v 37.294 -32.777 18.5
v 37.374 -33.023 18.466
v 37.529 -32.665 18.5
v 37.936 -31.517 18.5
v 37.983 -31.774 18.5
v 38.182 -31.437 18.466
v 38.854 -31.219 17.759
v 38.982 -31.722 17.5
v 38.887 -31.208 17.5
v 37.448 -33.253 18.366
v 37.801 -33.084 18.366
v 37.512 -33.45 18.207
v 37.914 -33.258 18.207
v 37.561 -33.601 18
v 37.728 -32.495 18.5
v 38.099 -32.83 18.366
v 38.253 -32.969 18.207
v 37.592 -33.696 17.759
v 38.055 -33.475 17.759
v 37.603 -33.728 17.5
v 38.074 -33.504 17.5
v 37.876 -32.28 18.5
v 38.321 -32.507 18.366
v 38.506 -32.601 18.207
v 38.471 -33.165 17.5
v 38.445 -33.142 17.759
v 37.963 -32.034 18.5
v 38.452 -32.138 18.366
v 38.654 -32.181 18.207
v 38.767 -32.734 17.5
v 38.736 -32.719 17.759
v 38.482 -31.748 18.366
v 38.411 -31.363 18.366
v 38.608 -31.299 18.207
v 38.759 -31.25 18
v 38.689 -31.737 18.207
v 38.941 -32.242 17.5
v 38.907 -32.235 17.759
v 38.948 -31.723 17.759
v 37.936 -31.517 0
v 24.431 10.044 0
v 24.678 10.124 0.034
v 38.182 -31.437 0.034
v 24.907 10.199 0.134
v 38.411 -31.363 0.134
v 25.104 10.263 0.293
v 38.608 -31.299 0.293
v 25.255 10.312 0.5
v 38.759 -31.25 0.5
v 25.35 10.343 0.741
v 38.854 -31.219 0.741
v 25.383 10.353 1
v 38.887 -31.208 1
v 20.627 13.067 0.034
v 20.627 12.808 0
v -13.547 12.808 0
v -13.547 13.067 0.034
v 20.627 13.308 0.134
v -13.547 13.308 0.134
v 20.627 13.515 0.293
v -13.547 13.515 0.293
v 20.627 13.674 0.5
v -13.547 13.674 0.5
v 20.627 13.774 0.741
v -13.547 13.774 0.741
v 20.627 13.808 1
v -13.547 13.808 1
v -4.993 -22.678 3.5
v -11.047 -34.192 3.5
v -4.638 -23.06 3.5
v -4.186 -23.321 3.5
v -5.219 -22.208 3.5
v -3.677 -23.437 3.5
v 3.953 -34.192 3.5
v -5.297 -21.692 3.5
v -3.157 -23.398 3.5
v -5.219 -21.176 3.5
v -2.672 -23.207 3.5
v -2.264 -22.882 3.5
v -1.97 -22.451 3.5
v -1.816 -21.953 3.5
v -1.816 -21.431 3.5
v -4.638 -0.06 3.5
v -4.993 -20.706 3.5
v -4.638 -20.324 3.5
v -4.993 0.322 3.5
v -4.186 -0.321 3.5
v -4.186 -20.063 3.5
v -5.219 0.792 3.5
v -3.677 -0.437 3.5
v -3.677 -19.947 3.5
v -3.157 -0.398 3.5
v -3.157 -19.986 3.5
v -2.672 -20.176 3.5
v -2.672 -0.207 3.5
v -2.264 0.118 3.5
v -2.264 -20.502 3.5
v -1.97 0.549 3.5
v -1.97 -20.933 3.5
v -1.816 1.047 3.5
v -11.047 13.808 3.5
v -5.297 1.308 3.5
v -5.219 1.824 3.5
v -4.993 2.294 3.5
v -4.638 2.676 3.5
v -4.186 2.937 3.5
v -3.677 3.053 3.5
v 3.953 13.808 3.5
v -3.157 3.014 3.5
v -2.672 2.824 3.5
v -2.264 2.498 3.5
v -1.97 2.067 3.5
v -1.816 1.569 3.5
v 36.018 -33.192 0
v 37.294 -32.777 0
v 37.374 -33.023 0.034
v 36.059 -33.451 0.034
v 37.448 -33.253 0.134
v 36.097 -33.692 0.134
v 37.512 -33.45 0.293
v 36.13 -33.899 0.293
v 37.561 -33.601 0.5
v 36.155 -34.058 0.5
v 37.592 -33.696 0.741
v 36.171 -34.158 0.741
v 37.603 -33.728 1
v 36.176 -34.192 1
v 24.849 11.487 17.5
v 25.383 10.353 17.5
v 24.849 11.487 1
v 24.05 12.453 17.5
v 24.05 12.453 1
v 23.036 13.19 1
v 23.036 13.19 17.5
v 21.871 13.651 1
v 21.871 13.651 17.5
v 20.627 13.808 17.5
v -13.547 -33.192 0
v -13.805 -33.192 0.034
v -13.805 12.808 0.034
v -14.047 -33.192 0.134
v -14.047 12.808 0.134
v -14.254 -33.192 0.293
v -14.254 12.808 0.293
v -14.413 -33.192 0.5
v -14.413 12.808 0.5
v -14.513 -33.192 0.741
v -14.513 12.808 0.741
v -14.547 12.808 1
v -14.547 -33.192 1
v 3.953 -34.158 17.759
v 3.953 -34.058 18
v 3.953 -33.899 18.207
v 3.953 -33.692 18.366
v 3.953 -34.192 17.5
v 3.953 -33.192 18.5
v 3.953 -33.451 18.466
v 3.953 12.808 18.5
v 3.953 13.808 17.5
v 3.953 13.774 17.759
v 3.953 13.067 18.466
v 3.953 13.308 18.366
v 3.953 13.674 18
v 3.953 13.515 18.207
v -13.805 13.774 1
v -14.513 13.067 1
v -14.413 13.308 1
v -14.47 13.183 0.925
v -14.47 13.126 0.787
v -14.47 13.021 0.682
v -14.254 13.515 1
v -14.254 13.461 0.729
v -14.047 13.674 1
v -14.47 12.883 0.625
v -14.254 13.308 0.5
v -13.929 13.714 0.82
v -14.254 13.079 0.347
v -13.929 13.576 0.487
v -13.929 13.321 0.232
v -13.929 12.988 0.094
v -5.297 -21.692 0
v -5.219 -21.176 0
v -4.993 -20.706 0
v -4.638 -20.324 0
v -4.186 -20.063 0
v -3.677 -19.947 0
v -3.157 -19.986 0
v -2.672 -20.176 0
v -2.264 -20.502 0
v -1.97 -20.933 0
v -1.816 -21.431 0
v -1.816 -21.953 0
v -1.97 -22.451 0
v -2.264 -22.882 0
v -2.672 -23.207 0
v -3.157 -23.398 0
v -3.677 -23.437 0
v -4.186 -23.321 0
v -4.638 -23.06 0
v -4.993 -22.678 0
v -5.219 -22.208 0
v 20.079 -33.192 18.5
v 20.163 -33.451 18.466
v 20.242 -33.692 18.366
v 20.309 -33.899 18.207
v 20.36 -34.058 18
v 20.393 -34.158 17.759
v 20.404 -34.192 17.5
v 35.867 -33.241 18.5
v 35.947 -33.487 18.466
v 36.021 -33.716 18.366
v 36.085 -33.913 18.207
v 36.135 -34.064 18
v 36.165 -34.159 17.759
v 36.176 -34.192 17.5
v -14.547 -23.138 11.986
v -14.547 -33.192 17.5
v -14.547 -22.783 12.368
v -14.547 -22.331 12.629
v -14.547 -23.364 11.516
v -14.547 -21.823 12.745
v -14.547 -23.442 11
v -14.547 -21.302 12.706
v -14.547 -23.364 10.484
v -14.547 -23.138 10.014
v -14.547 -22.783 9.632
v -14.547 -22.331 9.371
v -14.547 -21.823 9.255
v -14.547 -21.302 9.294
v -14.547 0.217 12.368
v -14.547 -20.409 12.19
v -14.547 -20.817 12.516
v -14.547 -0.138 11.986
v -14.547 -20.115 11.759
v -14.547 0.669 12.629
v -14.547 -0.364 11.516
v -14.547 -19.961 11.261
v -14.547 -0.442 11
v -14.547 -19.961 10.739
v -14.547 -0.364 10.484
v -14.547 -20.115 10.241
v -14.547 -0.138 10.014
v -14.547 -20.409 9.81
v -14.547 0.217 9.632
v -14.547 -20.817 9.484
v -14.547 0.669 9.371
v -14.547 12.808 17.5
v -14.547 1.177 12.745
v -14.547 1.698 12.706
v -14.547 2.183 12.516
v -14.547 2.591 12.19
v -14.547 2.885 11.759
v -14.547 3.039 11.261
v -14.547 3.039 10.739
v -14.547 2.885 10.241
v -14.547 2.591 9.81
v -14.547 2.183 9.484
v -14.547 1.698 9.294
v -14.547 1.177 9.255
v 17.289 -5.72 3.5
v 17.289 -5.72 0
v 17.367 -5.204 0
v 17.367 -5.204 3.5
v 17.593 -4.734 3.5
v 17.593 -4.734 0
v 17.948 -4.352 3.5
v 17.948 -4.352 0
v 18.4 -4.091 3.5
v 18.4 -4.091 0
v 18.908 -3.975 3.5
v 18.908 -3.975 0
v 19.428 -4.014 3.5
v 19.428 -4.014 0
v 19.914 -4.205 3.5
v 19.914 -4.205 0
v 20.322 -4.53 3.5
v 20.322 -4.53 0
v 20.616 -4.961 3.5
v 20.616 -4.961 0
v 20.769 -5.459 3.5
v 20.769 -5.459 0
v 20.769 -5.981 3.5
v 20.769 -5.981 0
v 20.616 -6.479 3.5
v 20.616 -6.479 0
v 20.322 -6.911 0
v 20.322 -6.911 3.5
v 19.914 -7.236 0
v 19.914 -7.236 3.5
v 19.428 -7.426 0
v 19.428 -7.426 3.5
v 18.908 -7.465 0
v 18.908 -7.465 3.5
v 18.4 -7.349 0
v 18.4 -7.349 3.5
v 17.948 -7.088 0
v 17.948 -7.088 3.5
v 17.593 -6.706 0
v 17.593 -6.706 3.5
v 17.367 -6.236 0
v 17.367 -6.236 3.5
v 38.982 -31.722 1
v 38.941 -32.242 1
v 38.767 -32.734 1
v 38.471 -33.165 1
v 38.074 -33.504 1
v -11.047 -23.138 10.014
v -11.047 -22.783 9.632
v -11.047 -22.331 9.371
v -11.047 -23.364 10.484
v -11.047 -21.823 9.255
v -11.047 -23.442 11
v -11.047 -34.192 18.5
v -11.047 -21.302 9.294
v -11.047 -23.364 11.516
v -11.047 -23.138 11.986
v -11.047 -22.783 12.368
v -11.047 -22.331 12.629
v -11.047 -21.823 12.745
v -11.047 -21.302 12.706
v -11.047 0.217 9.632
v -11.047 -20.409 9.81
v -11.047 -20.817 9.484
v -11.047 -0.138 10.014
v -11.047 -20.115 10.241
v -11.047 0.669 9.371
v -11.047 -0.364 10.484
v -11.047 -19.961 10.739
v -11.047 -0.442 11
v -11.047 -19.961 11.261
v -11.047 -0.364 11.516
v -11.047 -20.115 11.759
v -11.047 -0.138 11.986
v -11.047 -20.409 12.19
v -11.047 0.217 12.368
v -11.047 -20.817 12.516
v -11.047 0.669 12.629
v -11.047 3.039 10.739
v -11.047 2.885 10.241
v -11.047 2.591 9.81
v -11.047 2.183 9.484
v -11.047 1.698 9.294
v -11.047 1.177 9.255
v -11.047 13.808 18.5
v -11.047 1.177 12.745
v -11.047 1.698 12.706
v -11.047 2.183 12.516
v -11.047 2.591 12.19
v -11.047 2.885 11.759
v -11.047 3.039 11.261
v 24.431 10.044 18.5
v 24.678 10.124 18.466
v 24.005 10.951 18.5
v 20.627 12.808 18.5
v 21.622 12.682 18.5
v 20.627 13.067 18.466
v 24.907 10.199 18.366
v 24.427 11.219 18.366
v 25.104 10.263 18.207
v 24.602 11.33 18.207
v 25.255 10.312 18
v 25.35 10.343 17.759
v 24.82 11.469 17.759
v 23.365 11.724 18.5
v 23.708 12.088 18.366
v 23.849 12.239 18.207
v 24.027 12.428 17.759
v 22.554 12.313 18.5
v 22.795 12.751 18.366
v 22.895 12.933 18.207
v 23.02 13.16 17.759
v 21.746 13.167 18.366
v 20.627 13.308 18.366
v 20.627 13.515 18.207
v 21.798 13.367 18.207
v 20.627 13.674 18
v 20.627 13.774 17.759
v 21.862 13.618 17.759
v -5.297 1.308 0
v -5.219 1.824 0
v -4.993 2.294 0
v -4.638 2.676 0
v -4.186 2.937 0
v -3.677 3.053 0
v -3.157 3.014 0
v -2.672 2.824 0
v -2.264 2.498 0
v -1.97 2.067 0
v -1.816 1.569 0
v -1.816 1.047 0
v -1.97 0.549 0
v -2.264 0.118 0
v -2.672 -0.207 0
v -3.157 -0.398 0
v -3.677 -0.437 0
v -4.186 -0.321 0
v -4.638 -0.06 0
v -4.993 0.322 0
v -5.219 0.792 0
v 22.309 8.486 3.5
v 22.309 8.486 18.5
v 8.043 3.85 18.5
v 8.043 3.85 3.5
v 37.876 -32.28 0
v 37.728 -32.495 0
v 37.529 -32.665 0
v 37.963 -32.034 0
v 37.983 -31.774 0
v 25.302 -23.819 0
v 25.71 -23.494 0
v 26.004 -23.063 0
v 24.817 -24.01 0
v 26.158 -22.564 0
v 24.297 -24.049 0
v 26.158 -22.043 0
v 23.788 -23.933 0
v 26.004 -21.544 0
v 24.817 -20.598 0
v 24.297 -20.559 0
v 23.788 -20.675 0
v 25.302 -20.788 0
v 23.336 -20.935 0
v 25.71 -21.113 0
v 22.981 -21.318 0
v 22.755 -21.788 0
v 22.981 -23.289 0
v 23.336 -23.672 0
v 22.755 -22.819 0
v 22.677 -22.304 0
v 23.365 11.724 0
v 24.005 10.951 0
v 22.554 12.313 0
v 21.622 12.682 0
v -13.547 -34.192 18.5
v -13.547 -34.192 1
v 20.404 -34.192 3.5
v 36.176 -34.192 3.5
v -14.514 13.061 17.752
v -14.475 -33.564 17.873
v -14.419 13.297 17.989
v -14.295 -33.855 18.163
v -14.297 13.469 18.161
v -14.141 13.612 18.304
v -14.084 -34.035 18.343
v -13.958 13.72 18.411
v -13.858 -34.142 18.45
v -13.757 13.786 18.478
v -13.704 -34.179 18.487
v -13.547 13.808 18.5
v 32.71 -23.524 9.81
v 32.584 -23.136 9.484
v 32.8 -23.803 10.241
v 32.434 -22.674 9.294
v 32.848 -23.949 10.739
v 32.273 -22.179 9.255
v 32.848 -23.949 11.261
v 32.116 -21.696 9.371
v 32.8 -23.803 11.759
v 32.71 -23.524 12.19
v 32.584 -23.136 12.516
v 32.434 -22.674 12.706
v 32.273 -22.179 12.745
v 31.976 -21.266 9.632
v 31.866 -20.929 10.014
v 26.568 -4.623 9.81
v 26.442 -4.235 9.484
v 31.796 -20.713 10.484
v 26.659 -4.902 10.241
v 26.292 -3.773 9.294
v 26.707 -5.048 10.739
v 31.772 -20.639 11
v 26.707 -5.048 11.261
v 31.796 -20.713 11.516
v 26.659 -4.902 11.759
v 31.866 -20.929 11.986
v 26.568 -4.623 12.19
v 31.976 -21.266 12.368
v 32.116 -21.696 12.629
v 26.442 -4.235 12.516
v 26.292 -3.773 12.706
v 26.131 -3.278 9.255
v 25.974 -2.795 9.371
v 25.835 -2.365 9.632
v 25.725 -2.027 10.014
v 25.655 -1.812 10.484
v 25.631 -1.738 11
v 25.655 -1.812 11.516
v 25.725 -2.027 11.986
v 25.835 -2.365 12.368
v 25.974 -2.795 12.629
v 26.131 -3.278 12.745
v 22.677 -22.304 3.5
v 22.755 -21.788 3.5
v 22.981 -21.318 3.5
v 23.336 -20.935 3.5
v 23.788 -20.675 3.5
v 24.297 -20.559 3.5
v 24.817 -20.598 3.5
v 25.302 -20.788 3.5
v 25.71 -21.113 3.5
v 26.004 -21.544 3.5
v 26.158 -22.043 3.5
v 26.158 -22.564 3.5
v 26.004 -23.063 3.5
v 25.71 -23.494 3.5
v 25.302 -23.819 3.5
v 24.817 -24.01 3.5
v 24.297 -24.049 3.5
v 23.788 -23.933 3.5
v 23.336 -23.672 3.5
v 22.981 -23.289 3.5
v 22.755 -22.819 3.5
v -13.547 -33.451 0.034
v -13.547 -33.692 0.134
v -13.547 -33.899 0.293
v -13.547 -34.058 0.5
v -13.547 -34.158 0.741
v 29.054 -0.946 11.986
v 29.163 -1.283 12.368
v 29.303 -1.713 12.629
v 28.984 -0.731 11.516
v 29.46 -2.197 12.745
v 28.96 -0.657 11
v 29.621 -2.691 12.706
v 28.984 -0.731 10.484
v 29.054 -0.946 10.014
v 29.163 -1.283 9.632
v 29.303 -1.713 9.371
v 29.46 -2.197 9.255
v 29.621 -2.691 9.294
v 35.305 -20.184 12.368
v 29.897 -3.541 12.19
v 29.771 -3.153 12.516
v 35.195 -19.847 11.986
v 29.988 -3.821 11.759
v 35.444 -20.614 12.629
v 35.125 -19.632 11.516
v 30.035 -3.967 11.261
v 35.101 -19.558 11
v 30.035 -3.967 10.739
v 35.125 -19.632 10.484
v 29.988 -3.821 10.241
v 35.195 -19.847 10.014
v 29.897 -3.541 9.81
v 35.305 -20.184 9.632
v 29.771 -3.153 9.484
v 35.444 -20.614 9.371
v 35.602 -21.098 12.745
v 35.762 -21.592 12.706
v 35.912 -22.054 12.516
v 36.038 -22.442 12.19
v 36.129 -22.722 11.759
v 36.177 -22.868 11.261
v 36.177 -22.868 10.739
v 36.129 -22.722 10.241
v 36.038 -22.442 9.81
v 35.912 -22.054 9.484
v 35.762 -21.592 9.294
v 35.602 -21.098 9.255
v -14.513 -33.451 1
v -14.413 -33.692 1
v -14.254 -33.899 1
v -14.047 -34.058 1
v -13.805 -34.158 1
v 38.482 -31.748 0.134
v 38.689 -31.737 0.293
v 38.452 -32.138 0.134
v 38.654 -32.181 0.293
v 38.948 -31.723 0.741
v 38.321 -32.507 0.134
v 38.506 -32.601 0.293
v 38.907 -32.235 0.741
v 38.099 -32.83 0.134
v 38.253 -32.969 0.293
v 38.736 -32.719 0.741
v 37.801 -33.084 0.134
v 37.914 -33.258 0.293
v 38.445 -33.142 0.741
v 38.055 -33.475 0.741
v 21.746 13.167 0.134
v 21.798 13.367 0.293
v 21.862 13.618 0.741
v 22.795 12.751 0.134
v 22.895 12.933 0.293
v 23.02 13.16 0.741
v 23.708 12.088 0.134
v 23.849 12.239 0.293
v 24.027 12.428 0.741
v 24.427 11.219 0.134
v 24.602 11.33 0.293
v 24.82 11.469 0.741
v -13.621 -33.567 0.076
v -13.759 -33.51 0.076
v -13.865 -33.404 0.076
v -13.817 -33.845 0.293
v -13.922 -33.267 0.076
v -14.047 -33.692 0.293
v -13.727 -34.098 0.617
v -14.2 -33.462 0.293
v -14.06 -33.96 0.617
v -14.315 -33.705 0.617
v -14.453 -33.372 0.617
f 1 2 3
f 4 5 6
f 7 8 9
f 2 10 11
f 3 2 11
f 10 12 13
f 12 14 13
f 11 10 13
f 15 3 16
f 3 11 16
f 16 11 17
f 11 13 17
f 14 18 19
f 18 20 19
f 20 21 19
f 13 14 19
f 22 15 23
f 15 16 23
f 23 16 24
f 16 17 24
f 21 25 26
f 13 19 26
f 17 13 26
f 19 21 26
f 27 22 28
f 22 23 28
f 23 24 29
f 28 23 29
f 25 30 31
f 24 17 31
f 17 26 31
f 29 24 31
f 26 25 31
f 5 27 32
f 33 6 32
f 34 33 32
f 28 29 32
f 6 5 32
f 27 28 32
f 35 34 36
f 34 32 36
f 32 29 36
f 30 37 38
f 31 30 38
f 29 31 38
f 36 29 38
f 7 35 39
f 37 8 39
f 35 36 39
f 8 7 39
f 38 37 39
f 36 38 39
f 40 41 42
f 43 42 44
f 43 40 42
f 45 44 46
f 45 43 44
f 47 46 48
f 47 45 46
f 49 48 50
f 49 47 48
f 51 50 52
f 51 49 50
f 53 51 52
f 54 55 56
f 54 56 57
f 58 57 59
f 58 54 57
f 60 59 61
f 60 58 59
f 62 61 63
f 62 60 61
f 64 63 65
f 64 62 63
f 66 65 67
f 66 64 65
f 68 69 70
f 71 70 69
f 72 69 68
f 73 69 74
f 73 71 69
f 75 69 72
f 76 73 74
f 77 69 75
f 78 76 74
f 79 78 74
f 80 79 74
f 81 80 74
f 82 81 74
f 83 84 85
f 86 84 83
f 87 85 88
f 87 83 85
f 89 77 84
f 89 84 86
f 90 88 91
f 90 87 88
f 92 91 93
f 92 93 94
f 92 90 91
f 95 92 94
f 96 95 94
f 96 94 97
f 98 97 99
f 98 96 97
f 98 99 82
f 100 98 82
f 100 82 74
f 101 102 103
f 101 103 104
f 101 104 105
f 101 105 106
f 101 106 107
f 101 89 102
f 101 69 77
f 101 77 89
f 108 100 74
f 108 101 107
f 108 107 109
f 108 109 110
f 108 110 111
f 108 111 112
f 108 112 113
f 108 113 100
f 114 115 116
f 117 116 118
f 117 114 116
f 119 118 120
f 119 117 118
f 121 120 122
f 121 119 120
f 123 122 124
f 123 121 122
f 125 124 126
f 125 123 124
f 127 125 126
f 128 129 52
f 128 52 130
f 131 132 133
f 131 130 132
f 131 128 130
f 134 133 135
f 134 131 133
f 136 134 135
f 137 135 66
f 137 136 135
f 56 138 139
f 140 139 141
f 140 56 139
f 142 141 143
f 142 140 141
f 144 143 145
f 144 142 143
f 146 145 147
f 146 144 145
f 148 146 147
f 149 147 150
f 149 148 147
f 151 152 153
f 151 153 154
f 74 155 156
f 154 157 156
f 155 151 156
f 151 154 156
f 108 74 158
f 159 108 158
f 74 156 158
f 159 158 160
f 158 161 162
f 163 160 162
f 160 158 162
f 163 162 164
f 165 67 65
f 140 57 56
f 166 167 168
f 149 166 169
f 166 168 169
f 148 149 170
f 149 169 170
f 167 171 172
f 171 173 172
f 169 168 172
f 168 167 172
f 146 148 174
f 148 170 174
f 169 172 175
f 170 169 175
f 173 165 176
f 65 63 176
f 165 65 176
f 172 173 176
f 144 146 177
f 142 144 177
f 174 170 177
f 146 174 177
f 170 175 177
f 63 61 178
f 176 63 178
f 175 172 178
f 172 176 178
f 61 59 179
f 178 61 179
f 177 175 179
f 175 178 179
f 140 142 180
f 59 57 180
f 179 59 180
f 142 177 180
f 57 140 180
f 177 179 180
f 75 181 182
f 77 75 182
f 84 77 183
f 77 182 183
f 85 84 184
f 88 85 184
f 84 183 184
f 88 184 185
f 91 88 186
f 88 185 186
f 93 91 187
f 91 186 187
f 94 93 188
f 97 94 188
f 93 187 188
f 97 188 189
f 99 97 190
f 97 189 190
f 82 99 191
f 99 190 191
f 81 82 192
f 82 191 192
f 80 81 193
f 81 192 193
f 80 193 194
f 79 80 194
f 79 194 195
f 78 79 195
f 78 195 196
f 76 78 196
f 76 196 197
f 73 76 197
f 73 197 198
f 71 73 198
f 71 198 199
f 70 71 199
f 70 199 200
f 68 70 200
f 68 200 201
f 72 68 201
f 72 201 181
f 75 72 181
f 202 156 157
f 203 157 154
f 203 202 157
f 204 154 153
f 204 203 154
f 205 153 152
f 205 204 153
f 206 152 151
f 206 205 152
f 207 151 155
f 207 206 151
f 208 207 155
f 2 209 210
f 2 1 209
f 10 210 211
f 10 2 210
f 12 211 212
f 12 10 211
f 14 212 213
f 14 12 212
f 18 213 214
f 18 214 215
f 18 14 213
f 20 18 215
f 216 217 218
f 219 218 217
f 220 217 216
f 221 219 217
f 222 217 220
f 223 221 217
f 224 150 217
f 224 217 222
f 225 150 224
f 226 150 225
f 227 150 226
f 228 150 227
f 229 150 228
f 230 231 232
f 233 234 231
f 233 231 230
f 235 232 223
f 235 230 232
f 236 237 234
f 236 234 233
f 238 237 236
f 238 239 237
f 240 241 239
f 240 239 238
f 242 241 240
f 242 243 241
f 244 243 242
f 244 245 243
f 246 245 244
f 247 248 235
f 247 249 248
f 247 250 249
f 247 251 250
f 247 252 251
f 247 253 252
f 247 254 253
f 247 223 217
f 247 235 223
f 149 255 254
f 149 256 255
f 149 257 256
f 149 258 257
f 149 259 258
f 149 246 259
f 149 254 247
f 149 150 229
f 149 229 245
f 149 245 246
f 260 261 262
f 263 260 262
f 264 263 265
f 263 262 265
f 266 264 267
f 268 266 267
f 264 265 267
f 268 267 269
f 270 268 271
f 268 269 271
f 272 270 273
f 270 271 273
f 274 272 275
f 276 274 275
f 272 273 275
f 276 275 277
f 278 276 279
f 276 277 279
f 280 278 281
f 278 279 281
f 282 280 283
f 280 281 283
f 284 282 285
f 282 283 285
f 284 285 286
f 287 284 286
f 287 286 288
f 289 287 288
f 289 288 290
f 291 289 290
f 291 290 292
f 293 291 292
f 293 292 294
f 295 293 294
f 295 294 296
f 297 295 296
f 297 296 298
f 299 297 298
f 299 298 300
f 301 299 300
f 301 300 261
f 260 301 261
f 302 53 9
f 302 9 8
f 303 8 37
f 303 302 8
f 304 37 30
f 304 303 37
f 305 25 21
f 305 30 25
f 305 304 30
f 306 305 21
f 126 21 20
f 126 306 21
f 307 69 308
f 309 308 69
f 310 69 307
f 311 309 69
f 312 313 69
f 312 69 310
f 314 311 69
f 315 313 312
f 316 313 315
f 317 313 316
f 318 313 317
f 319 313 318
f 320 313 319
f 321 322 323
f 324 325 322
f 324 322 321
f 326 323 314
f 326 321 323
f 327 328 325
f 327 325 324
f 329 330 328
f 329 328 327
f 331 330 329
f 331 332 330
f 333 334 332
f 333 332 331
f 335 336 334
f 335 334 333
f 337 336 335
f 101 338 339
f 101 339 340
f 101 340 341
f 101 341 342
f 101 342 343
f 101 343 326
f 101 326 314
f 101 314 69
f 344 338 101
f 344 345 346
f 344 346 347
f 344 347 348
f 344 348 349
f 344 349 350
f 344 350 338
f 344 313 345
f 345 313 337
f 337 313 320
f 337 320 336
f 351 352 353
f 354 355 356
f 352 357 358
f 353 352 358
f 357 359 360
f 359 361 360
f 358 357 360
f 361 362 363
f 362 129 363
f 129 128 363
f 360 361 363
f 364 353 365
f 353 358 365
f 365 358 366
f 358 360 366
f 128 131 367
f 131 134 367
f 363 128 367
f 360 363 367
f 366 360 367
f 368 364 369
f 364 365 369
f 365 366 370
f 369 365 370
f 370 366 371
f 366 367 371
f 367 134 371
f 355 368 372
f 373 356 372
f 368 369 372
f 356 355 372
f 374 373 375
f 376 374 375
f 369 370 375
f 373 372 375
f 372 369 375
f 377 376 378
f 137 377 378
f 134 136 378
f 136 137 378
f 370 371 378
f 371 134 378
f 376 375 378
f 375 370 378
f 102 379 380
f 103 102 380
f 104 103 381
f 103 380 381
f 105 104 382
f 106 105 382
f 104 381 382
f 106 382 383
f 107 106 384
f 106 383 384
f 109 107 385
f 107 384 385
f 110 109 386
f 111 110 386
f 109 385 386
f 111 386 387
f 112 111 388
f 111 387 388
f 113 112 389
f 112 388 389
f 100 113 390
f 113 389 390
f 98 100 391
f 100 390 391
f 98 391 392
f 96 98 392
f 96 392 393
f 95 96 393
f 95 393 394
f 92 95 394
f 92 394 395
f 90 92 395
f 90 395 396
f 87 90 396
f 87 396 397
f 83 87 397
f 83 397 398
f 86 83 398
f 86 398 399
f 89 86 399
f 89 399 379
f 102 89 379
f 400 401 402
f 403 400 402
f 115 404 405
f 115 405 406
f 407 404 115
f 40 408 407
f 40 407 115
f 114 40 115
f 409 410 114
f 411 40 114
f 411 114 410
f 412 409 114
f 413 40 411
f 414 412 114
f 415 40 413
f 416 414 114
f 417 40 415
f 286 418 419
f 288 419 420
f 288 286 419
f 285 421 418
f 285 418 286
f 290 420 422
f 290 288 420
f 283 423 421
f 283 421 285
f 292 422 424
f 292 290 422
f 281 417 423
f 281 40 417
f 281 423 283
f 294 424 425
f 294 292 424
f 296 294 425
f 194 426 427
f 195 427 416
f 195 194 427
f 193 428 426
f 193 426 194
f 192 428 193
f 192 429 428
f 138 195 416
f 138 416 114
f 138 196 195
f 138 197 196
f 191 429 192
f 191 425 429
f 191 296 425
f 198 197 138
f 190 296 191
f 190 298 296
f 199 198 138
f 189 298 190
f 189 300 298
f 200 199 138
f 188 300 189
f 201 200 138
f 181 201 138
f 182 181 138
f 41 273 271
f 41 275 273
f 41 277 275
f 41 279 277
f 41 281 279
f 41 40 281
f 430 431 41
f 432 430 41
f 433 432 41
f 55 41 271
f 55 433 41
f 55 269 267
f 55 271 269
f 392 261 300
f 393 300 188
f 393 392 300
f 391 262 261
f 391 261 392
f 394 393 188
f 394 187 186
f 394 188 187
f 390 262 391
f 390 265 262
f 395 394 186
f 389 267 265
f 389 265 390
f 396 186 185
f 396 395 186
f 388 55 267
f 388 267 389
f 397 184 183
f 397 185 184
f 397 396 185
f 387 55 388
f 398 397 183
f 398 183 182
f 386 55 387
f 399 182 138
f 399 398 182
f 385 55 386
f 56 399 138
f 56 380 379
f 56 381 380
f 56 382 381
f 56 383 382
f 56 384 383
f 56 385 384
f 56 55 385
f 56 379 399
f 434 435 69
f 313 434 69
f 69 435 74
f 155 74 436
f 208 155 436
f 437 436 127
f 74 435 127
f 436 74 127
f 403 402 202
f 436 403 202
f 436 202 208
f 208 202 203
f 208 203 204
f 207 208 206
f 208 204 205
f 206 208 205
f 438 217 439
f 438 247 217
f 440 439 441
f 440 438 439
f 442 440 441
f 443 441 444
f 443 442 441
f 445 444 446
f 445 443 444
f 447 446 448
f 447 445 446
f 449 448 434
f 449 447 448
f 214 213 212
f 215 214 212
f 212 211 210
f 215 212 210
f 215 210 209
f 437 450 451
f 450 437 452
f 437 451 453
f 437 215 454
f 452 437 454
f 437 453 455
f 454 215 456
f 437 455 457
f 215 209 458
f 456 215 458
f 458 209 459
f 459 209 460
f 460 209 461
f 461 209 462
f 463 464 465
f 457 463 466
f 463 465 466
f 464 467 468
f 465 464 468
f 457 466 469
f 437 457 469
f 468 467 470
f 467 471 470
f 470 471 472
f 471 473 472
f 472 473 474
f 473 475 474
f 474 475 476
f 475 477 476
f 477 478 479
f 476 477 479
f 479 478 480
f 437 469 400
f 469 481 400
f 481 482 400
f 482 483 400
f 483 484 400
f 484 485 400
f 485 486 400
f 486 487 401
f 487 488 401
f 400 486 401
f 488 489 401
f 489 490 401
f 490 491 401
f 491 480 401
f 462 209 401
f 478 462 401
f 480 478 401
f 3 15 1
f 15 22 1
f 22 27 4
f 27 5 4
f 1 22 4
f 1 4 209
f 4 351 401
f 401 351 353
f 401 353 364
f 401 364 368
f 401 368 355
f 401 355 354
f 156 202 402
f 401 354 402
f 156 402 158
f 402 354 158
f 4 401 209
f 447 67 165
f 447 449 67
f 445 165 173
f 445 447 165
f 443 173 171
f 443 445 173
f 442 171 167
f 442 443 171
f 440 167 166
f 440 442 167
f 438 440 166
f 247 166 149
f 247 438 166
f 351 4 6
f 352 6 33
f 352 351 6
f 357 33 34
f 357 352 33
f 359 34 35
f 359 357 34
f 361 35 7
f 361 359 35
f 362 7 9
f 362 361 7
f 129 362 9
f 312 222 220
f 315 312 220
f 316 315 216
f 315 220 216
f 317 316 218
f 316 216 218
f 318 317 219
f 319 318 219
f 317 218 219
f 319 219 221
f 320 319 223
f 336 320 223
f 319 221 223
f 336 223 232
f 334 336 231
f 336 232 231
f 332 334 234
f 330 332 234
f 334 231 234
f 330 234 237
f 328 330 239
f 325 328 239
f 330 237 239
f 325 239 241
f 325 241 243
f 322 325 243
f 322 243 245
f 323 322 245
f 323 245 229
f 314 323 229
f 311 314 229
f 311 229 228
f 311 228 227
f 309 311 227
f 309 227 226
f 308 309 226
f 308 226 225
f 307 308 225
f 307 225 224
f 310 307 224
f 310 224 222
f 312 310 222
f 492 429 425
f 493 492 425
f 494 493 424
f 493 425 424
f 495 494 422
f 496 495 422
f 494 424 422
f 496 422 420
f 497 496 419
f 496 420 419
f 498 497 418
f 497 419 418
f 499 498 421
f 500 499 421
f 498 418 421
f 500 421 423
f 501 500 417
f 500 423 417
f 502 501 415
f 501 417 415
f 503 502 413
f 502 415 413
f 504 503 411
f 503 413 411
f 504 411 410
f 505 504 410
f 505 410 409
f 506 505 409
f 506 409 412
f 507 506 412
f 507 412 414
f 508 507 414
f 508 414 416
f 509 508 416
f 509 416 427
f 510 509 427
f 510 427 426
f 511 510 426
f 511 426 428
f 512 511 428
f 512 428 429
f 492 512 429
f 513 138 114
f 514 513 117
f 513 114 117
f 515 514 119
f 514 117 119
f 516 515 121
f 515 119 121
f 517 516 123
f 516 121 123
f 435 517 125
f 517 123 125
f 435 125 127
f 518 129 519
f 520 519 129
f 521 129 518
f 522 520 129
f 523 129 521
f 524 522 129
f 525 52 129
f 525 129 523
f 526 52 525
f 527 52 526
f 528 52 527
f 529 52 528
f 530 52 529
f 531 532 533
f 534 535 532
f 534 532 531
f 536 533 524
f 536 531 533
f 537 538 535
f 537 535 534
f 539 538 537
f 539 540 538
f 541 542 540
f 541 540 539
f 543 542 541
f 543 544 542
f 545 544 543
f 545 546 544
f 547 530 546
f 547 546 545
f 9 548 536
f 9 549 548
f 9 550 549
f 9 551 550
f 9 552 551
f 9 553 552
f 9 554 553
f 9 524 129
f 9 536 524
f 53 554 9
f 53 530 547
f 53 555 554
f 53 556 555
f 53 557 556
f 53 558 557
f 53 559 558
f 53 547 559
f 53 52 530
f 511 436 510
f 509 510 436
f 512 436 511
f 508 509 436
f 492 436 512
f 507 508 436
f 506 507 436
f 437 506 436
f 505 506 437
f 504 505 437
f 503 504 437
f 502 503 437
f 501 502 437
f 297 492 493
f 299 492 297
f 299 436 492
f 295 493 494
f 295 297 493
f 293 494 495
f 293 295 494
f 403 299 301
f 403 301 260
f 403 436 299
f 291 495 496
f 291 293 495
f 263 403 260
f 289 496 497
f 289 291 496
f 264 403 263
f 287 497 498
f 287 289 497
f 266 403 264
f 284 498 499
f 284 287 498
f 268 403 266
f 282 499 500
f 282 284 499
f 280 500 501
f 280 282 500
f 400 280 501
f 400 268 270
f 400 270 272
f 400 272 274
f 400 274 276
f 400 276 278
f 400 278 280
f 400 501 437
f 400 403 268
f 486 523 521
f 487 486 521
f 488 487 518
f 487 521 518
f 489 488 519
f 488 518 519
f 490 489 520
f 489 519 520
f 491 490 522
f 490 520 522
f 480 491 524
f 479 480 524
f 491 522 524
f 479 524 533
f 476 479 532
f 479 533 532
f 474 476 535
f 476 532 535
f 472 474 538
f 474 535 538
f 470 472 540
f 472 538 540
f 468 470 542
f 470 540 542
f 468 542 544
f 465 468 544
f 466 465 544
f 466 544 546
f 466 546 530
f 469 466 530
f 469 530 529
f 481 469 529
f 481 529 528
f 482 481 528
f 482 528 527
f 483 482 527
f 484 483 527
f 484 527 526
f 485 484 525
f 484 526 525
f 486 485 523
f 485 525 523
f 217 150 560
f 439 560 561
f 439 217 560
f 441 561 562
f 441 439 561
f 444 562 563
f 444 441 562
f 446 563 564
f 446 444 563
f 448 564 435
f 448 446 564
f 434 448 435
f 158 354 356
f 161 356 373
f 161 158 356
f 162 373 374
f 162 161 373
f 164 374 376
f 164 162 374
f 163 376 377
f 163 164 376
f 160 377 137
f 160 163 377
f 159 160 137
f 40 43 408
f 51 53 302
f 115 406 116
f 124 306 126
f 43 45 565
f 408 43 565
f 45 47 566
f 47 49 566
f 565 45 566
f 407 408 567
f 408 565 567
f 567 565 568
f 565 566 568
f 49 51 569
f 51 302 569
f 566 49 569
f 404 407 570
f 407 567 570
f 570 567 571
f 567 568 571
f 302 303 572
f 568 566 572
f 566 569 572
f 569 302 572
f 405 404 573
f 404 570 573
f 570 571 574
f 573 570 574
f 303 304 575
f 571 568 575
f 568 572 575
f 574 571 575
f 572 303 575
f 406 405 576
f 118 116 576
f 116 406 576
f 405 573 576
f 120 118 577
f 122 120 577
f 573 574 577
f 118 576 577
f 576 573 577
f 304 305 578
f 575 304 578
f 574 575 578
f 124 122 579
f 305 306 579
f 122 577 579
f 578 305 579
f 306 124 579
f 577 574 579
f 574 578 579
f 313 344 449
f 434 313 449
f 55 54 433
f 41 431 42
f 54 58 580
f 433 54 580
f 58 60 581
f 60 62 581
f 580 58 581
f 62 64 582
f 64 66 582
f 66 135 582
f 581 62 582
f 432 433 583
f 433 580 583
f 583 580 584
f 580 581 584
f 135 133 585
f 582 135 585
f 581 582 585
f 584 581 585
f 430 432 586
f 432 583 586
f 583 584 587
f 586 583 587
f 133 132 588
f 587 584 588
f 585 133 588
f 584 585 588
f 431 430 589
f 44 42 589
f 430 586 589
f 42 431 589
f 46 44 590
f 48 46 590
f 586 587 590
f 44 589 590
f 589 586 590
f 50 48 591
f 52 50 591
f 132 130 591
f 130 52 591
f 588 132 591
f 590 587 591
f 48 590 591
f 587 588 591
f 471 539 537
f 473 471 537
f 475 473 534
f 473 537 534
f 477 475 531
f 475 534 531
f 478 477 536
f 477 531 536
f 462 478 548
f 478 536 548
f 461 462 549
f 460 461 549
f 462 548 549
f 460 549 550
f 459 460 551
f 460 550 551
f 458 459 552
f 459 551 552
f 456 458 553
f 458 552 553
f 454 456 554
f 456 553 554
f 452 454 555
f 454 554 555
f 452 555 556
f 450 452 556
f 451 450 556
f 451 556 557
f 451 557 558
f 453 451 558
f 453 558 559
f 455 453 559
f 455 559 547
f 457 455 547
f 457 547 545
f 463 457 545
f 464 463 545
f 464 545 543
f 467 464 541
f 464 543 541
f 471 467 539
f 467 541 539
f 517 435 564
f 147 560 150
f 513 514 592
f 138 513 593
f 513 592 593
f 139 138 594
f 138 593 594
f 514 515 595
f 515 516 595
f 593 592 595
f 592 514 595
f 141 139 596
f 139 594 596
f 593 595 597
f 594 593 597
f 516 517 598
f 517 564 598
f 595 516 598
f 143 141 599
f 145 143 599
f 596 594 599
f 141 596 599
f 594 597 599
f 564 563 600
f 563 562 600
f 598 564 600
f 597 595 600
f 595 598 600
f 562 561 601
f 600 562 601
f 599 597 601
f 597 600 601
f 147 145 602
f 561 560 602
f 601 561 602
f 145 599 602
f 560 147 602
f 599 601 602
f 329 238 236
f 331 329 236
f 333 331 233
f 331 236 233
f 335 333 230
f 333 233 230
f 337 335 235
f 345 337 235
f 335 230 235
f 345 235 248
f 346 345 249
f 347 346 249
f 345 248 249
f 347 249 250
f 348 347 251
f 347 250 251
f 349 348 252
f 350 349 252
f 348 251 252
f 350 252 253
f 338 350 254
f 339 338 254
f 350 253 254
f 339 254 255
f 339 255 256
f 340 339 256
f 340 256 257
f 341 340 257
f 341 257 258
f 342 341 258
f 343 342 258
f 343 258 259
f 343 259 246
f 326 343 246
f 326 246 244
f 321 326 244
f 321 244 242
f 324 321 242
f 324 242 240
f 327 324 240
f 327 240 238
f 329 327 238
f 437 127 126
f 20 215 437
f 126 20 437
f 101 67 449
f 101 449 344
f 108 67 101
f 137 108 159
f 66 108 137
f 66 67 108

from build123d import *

# Parameters (mm, degrees)
BOSS_EXTRUDE1_DEPTH = 18.5
SKETCH2_W           = 15
SKETCH2_H           = 48
CUT_EXTRUDE1_DEPTH  = 15
SKETCH3_R           = 1.75
CUT_EXTRUDE2_DEPTH  = 3.5
SKETCH4_R           = 1.75
CUT_EXTRUDE3_DEPTH  = 4
SKETCH5_R           = 1.75
CUT_EXTRUDE4_DEPTH  = 4
CUT_EXTRUDE5_DEPTH  = 19
FILLET1_R           = 2
FILLET2_R           = 5
FILLET3_R           = 1


with BuildPart() as part:
    # Sketch1 → Boss-Extrude1 (new body)
    with BuildSketch(Plane.XY):
        Polygon((24.259932708, 13.808119809), (39.856078127, -34.191880191), (7.453399362, -34.191880191), (-14.546600638, -34.191880191), (-14.546600638, 13.808119809), align=None)
    extrude(amount=BOSS_EXTRUDE1_DEPTH)

    # Sketch2 → Cut-Extrude1 (cut)
    with BuildSketch(Plane.XY.offset(18.5)):
        with Locations((-3.546600638, -10.191880191)):
            Rectangle(SKETCH2_W, SKETCH2_H)
        Polygon((36.175960342, -34.191880191), (22.309194948, 8.485635376), (8.043347203, 3.85038046), (20.404026978, -34.191880191), align=None)
    extrude(amount=-CUT_EXTRUDE1_DEPTH, mode=Mode.SUBTRACT)

    # Sketch3 → Cut-Extrude2 (cut)
    with BuildSketch(Plane(origin=(26.001419868, 8.448373445, 0), x_dir=(0, 0, -1), z_dir=(0.9510565162951533, 0.3090169943749487, 0))):
        with Locations(Location((-11, -31.197396994, 0), (0, 0, 90))):
            Circle(SKETCH3_R)
        with Locations(Location((-11, -11.323601551, 0), (0, 0, 90))):
            Circle(SKETCH3_R)
    extrude(amount=-CUT_EXTRUDE2_DEPTH, mode=Mode.SUBTRACT)

    # Sketch4 → Cut-Extrude3 (cut)
    with BuildSketch(Plane(origin=(0, 0, 0), x_dir=(-1, 0, 0), z_dir=(0, 0, -1))):
        with Locations((-24.427281231, -22.303673738)):
            Circle(SKETCH4_R)
        with Locations((-19.038983505, -5.720198536)):
            Circle(SKETCH4_R)
        with Locations((3.546600638, 1.308119809)):
            Circle(SKETCH4_R)
        with Locations((3.546600638, -21.691880191)):
            Circle(SKETCH4_R)
    extrude(amount=-CUT_EXTRUDE3_DEPTH, mode=Mode.SUBTRACT)

    # Sketch5 → Cut-Extrude4 (cut)
    with BuildSketch(Plane.ZY.offset(14.546600638)):
        with Locations(Location((11, -21.691880191, 0), (0, 0, 270))):
            Circle(SKETCH5_R)
        with Locations(Location((11, 1.308119809, 0), (0, 0, 270))):
            Circle(SKETCH5_R)
    extrude(amount=-CUT_EXTRUDE4_DEPTH, mode=Mode.SUBTRACT)

    # Sketch6 → Cut-Extrude5 (cut)
    with BuildSketch(Plane.XY.offset(18.5)):
        Polygon((36.175960342, -34.191880191), (39.504658149, -33.110320711), (39.856078127, -34.191880191), align=None)
    extrude(amount=-CUT_EXTRUDE5_DEPTH, mode=Mode.SUBTRACT)

    # Fillet1
    fillet1_edges = [part.edges().sort_by_distance(p)[0] for p in [
        (39.504658149, -33.110320711, 9.25),
    ]]
    fillet(fillet1_edges, radius=FILLET1_R)

    # Fillet2
    fillet2_edges = [part.edges().sort_by_distance(p)[0] for p in [
        (24.259932708, 13.808119809, 9.25),
    ]]
    fillet(fillet2_edges, radius=FILLET2_R)

    # Fillet3
    fillet3_edges = [part.edges().sort_by_distance(p)[0] for p in [
        (36.889252729, -33.960117446, 18.5),
        (38.766524176, -32.734222667, 18.5),
        (32.134563405, -10.427501449, 18.5),
        (23.566146329, 12.85320478, 18.5),
        (36.889252729, -33.960117446, 0),
        (38.766524176, -32.734222667, 0),
        (32.134563405, -10.427501449, 0),
        (23.566146329, 12.85320478, 0),
        (12.17871317, -34.191880191, 18.5),
        (12.290309715, 13.808119809, 18.5),
        (-14.546600638, -34.191880191, 9.25),
        (-14.546600638, 13.808119809, 9.25),
        (-14.546600638, -10.191880191, 18.5),
        (10.814679852, -34.191880191, 0),
        (3.040309715, 13.808119809, 0),
        (-14.546600638, -10.191880191, 0),
    ]]
    fillet(fillet3_edges, radius=FILLET3_R)


solid = part.part
